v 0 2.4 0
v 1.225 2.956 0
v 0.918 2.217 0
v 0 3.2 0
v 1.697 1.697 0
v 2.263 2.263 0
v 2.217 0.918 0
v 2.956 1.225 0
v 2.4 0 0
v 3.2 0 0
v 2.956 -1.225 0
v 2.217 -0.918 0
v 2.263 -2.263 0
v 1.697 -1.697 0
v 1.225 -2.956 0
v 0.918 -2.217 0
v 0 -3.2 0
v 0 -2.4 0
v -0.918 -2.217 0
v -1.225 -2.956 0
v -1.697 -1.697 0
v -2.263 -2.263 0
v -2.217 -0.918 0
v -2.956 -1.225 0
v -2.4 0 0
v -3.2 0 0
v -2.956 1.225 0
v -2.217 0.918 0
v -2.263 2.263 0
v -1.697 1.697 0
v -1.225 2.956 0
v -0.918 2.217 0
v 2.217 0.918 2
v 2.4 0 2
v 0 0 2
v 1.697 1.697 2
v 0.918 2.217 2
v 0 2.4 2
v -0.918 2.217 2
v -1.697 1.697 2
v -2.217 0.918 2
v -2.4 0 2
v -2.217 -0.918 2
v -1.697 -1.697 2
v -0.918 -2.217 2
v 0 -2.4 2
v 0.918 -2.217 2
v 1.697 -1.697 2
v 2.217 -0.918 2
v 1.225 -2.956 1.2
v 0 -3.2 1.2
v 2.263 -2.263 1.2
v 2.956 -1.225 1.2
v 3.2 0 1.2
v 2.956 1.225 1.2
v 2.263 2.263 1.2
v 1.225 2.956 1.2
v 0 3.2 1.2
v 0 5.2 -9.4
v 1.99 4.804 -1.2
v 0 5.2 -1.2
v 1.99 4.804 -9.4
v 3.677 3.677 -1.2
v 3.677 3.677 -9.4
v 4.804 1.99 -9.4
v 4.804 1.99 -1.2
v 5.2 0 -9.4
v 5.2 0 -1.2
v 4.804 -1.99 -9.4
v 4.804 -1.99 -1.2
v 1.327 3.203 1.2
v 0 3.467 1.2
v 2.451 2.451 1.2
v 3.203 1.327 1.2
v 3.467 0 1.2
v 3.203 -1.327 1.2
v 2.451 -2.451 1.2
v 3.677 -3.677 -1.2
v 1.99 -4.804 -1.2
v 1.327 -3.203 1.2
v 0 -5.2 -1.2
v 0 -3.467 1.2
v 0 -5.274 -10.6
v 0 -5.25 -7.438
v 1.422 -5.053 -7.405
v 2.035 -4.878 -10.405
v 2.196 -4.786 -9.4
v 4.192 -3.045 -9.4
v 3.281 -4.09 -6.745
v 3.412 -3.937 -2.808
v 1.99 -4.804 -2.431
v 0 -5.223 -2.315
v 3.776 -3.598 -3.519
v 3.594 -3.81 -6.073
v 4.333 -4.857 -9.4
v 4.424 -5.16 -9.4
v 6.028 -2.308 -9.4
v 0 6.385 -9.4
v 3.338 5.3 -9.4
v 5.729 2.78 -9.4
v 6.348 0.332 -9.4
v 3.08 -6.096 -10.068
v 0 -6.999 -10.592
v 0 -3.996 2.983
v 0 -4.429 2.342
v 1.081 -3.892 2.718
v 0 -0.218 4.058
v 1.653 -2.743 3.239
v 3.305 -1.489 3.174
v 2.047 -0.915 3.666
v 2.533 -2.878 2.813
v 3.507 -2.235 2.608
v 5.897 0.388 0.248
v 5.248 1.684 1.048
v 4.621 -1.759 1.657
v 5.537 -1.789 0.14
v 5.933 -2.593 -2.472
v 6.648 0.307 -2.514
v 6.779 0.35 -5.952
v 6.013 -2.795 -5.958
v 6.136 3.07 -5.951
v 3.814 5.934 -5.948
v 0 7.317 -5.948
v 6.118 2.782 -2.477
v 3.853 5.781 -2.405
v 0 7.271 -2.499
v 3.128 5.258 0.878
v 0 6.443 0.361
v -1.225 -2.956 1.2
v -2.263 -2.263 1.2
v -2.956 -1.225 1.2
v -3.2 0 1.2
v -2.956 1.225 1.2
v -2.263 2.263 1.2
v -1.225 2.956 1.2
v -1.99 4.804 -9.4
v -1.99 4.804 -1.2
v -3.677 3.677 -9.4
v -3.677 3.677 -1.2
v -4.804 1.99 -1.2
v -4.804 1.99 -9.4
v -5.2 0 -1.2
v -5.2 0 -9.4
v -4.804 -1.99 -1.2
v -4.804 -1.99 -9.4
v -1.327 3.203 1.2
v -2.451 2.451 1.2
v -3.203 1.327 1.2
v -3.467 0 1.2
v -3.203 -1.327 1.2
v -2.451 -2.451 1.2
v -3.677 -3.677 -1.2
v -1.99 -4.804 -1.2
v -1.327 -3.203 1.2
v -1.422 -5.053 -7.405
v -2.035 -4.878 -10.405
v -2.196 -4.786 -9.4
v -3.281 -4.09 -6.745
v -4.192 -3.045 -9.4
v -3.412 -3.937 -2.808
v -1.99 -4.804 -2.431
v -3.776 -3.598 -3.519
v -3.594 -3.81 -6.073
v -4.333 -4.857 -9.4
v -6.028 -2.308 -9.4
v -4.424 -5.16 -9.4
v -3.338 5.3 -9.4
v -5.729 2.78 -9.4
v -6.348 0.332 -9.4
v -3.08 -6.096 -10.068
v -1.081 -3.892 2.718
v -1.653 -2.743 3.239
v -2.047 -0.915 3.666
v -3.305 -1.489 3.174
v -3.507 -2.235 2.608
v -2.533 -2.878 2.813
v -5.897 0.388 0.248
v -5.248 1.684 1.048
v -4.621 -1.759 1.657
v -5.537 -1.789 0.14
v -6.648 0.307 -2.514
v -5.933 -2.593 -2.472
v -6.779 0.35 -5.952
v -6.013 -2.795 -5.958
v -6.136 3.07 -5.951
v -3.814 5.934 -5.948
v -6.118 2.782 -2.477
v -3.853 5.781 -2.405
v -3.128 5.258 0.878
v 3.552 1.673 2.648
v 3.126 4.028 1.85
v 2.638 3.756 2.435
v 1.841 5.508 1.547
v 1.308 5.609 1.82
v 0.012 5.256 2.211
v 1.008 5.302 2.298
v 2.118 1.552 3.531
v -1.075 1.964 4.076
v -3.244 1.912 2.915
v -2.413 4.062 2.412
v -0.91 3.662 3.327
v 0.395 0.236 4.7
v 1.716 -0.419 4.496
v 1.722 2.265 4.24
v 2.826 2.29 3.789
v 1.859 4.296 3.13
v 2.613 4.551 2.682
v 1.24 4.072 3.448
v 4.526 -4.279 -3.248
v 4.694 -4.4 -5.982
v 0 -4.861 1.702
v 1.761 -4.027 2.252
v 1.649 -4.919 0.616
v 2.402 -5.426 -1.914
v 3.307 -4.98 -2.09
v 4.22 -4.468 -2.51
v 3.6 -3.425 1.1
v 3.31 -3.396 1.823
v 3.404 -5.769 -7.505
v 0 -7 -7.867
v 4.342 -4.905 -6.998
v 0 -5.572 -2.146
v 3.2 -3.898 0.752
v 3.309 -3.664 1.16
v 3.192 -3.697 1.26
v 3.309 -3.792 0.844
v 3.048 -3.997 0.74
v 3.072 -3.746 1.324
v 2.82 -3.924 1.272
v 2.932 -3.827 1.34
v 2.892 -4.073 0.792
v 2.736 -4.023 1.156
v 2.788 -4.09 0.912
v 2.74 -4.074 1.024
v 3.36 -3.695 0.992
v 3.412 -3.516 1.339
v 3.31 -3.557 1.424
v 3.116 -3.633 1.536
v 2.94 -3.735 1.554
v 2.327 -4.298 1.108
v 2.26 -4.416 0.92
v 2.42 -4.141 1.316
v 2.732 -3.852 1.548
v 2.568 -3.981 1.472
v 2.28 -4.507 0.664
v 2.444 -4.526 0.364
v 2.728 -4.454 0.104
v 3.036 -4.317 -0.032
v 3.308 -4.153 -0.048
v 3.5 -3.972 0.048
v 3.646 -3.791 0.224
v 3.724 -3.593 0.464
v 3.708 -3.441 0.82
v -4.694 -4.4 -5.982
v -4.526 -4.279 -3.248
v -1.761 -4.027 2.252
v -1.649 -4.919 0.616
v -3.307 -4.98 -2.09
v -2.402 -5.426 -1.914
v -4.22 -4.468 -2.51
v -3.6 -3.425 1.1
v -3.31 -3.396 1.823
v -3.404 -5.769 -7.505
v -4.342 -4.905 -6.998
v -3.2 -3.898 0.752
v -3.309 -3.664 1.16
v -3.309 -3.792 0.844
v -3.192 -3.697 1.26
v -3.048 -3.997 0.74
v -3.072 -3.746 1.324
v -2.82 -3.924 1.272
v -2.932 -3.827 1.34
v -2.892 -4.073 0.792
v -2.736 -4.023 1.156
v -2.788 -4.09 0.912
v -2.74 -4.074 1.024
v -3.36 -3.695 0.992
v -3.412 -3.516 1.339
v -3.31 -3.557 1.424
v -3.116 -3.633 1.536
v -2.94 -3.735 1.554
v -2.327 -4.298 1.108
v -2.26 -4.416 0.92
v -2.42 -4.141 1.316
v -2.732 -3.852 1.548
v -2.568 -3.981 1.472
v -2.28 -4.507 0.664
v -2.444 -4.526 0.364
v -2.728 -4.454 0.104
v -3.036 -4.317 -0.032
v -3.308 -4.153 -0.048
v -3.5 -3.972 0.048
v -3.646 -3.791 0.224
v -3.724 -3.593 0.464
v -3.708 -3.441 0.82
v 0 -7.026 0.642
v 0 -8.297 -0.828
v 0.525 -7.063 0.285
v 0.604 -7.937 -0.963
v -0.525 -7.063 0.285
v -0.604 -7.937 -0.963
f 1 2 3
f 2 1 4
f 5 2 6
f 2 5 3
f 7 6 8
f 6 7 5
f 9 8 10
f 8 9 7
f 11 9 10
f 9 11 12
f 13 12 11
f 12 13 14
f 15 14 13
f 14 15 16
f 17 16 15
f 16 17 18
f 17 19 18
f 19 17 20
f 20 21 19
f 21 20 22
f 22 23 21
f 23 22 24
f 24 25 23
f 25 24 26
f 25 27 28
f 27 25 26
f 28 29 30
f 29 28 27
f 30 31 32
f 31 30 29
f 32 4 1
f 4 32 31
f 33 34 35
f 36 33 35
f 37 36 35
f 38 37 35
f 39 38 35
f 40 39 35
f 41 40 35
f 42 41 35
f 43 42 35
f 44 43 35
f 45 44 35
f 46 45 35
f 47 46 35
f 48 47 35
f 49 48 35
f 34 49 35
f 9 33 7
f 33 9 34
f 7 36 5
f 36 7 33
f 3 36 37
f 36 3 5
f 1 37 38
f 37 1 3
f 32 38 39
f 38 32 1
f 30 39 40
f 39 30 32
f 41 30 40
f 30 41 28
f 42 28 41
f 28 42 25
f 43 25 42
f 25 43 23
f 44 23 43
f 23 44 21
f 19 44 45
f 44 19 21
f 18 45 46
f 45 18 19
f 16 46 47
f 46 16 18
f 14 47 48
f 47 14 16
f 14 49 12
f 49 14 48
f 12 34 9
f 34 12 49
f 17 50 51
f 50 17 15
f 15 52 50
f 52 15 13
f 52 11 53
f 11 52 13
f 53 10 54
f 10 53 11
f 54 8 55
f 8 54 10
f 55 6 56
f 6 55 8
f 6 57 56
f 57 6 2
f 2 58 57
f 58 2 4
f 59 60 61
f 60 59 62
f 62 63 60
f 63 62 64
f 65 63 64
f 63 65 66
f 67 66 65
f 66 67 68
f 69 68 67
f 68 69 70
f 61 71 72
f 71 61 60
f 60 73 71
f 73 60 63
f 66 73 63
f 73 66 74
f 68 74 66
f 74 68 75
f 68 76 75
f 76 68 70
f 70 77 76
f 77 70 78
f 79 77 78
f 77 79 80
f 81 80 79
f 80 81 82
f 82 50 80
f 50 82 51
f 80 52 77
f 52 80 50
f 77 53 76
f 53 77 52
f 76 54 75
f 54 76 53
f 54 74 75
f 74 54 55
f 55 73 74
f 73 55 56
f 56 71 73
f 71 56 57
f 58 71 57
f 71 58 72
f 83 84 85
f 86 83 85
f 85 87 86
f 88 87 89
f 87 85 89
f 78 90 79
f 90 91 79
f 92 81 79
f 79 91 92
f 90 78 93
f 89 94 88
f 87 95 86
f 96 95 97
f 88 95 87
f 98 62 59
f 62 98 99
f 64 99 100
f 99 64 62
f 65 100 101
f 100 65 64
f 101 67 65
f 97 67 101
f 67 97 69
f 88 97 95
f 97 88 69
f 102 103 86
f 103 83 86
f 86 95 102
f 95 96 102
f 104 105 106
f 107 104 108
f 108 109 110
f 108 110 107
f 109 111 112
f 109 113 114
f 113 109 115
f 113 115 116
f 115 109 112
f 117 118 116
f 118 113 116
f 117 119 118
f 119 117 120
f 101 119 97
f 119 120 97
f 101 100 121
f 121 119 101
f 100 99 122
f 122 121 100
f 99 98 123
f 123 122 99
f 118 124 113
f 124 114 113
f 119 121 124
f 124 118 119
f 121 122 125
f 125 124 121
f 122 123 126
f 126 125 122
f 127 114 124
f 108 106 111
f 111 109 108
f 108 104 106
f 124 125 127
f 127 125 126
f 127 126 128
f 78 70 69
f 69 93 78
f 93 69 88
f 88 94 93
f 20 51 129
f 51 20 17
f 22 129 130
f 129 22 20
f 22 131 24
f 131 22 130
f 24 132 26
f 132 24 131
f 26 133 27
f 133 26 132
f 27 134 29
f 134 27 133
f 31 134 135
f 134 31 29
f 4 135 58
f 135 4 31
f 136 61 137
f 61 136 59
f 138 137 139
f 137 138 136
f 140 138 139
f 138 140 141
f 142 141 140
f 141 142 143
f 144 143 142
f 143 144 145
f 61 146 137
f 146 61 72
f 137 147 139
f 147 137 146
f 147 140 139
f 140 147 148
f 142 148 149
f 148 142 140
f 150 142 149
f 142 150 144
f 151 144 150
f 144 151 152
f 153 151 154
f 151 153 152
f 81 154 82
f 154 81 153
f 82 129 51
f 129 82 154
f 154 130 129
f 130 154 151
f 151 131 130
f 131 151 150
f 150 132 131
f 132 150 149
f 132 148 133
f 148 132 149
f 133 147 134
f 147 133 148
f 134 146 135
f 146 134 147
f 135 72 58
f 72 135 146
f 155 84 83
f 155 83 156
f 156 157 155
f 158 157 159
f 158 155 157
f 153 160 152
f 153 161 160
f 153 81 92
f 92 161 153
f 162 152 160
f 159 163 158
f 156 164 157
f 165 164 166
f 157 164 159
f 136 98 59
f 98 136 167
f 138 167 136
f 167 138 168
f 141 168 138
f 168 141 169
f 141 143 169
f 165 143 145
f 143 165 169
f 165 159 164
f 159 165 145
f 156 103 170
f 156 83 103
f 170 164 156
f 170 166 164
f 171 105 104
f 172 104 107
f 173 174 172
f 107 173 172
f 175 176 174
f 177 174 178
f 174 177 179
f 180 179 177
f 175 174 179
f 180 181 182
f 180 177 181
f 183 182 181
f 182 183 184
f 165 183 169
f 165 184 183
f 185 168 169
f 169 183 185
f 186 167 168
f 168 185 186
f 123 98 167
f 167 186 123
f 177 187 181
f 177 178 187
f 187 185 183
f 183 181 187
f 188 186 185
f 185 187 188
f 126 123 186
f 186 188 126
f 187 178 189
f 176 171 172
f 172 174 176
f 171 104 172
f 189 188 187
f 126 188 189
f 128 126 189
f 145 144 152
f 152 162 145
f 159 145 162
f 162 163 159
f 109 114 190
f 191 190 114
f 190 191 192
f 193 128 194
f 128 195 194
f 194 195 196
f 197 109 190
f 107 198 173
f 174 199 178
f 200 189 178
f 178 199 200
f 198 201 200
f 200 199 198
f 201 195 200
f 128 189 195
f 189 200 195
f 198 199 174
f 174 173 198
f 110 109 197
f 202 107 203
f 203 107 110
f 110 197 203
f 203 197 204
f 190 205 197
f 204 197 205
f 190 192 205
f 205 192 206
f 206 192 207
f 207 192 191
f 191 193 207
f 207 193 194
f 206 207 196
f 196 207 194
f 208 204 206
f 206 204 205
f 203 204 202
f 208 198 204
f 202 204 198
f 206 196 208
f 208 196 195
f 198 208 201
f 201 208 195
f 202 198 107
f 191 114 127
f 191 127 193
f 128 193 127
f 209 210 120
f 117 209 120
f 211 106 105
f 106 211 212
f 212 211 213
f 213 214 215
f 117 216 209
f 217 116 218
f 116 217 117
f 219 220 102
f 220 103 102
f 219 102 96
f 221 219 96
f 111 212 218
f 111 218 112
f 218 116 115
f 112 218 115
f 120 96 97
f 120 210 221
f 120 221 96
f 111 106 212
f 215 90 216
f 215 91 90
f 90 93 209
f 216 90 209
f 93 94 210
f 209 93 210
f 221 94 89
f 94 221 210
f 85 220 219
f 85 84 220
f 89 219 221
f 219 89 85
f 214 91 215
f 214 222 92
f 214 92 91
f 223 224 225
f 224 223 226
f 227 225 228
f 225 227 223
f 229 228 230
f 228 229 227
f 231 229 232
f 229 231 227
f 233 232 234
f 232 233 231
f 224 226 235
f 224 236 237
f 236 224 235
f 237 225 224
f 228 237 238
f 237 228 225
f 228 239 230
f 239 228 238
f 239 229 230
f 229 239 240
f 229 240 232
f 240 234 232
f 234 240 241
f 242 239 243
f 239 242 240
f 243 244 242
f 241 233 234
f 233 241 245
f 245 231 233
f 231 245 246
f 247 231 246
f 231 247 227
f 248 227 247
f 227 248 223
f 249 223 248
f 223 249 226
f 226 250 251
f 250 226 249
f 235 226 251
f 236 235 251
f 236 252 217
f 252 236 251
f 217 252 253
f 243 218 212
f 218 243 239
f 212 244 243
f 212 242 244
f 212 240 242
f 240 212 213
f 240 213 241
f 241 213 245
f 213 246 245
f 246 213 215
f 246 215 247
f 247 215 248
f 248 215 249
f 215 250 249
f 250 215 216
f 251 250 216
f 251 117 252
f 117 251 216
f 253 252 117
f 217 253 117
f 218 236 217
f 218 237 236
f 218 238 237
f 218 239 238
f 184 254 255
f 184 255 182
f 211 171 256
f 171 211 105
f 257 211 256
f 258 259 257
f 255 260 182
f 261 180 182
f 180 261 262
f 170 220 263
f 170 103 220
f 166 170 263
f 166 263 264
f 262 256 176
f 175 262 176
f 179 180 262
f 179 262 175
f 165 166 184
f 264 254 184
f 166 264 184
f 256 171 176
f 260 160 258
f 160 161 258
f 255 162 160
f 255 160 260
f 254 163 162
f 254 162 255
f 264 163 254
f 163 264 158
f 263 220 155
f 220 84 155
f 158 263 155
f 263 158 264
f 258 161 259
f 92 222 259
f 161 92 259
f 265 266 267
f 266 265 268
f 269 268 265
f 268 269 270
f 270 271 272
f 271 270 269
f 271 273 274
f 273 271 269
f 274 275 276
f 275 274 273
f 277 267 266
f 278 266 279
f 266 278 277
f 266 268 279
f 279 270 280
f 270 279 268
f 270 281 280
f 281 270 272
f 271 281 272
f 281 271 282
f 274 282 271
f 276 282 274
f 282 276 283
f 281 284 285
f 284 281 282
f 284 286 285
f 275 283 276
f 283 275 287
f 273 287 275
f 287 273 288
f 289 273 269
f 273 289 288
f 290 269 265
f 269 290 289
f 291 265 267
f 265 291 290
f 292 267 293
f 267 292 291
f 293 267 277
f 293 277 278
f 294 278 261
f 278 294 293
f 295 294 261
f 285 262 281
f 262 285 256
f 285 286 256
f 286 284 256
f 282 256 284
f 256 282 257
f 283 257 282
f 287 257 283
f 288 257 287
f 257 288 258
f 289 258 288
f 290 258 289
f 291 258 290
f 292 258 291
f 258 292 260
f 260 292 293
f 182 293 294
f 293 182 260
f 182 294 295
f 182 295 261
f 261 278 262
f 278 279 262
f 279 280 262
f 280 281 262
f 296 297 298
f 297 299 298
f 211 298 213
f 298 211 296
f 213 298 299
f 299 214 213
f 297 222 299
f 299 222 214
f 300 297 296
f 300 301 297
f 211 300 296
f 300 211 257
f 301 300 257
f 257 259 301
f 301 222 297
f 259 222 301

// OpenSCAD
use <../lib.scad>
use <s/25971p01s01.scad>
use <s/25971s01.scad>
use <s/25971s02.scad>
use <s/25971s04.scad>
use <../p/stud4o.scad>
function ldraw_lib__25971p02() = [
// 0 Minifig Headdress Bird with Black Eye and Bright Light Yellow Beak Pattern
// 0 Name: 25971p02.dat
// 0 Author: Philippe Hurbain [Philo]
// 0 !LDRAW_ORG Part UPDATE 2022-01
// 0 !LICENSE Licensed under CC BY 4.0 : see CAreadme.txt
// 
// 0 BFC CERTIFY CCW
  [0,"BFC","CERTIFY"],
  [0,"BFC","CCW"],
// 
// 0 !CATEGORY Minifig Headwear
// 0 !KEYWORDS Chicken, Skater, Suit
// 
// 0 !HISTORY 2016-10-05 {LEGO Digital Designer} Original part shape
// 0 !HISTORY 2019-05-19 [Philo] File preparation for LDraw Parts Tracker
// 0 !HISTORY 2022-01-14 [PTadmin] Official Update 2022-01
// 
// 
// 1 16 0 -5 0 -1 0 0 0 -1.25 0 0 0 1 stud4o.dat
  [1,16,0,-5,0,-1,0,0,0,-1.25,0,0,0,1, ldraw_lib__stud4o()],
// 1 16 0 0 0 1 0 0 0 1 0 0 0 1 s\25971s01.dat
  [1,16,0,0,0,1,0,0,0,1,0,0,0,1, ldraw_lib__s__25971s01()],
// 1 16 0 0 0 -1 0 0 0 1 0 0 0 1 s\25971s01.dat
  [1,16,0,0,0,-1,0,0,0,1,0,0,0,1, ldraw_lib__s__25971s01()],
// 1 16 0 0 0 1 0 0 0 1 0 0 0 1 s\25971s02.dat
  [1,16,0,0,0,1,0,0,0,1,0,0,0,1, ldraw_lib__s__25971s02()],
// 1 16 0 0 0 1 0 0 0 1 0 0 0 1 s\25971p01s01.dat
  [1,16,0,0,0,1,0,0,0,1,0,0,0,1, ldraw_lib__s__25971p01s01()],
// 1 16 0 0 0 -1 0 0 0 1 0 0 0 1 s\25971p01s01.dat
  [1,16,0,0,0,-1,0,0,0,1,0,0,0,1, ldraw_lib__s__25971p01s01()],
// 1 191 0 0 0 1 0 0 0 1 0 0 0 1 s\25971s04.dat
  [1,191,0,0,0,1,0,0,0,1,0,0,0,1, ldraw_lib__s__25971s04()],
// 1 191 0 0 0 -1 0 0 0 1 0 0 0 1 s\25971s04.dat
  [1,191,0,0,0,-1,0,0,0,1,0,0,0,1, ldraw_lib__s__25971s04()],
];
module ldraw_lib__25971p02(step=0, col=false, unit=2/5, alt=false, line=0.2, solid=!$preview)
    makepoly(ldraw_lib__25971p02(), step=step, col=col, unit=unit, alt=alt, line=line, solid=solid);
ldraw_lib__25971p02(line=0.2);
